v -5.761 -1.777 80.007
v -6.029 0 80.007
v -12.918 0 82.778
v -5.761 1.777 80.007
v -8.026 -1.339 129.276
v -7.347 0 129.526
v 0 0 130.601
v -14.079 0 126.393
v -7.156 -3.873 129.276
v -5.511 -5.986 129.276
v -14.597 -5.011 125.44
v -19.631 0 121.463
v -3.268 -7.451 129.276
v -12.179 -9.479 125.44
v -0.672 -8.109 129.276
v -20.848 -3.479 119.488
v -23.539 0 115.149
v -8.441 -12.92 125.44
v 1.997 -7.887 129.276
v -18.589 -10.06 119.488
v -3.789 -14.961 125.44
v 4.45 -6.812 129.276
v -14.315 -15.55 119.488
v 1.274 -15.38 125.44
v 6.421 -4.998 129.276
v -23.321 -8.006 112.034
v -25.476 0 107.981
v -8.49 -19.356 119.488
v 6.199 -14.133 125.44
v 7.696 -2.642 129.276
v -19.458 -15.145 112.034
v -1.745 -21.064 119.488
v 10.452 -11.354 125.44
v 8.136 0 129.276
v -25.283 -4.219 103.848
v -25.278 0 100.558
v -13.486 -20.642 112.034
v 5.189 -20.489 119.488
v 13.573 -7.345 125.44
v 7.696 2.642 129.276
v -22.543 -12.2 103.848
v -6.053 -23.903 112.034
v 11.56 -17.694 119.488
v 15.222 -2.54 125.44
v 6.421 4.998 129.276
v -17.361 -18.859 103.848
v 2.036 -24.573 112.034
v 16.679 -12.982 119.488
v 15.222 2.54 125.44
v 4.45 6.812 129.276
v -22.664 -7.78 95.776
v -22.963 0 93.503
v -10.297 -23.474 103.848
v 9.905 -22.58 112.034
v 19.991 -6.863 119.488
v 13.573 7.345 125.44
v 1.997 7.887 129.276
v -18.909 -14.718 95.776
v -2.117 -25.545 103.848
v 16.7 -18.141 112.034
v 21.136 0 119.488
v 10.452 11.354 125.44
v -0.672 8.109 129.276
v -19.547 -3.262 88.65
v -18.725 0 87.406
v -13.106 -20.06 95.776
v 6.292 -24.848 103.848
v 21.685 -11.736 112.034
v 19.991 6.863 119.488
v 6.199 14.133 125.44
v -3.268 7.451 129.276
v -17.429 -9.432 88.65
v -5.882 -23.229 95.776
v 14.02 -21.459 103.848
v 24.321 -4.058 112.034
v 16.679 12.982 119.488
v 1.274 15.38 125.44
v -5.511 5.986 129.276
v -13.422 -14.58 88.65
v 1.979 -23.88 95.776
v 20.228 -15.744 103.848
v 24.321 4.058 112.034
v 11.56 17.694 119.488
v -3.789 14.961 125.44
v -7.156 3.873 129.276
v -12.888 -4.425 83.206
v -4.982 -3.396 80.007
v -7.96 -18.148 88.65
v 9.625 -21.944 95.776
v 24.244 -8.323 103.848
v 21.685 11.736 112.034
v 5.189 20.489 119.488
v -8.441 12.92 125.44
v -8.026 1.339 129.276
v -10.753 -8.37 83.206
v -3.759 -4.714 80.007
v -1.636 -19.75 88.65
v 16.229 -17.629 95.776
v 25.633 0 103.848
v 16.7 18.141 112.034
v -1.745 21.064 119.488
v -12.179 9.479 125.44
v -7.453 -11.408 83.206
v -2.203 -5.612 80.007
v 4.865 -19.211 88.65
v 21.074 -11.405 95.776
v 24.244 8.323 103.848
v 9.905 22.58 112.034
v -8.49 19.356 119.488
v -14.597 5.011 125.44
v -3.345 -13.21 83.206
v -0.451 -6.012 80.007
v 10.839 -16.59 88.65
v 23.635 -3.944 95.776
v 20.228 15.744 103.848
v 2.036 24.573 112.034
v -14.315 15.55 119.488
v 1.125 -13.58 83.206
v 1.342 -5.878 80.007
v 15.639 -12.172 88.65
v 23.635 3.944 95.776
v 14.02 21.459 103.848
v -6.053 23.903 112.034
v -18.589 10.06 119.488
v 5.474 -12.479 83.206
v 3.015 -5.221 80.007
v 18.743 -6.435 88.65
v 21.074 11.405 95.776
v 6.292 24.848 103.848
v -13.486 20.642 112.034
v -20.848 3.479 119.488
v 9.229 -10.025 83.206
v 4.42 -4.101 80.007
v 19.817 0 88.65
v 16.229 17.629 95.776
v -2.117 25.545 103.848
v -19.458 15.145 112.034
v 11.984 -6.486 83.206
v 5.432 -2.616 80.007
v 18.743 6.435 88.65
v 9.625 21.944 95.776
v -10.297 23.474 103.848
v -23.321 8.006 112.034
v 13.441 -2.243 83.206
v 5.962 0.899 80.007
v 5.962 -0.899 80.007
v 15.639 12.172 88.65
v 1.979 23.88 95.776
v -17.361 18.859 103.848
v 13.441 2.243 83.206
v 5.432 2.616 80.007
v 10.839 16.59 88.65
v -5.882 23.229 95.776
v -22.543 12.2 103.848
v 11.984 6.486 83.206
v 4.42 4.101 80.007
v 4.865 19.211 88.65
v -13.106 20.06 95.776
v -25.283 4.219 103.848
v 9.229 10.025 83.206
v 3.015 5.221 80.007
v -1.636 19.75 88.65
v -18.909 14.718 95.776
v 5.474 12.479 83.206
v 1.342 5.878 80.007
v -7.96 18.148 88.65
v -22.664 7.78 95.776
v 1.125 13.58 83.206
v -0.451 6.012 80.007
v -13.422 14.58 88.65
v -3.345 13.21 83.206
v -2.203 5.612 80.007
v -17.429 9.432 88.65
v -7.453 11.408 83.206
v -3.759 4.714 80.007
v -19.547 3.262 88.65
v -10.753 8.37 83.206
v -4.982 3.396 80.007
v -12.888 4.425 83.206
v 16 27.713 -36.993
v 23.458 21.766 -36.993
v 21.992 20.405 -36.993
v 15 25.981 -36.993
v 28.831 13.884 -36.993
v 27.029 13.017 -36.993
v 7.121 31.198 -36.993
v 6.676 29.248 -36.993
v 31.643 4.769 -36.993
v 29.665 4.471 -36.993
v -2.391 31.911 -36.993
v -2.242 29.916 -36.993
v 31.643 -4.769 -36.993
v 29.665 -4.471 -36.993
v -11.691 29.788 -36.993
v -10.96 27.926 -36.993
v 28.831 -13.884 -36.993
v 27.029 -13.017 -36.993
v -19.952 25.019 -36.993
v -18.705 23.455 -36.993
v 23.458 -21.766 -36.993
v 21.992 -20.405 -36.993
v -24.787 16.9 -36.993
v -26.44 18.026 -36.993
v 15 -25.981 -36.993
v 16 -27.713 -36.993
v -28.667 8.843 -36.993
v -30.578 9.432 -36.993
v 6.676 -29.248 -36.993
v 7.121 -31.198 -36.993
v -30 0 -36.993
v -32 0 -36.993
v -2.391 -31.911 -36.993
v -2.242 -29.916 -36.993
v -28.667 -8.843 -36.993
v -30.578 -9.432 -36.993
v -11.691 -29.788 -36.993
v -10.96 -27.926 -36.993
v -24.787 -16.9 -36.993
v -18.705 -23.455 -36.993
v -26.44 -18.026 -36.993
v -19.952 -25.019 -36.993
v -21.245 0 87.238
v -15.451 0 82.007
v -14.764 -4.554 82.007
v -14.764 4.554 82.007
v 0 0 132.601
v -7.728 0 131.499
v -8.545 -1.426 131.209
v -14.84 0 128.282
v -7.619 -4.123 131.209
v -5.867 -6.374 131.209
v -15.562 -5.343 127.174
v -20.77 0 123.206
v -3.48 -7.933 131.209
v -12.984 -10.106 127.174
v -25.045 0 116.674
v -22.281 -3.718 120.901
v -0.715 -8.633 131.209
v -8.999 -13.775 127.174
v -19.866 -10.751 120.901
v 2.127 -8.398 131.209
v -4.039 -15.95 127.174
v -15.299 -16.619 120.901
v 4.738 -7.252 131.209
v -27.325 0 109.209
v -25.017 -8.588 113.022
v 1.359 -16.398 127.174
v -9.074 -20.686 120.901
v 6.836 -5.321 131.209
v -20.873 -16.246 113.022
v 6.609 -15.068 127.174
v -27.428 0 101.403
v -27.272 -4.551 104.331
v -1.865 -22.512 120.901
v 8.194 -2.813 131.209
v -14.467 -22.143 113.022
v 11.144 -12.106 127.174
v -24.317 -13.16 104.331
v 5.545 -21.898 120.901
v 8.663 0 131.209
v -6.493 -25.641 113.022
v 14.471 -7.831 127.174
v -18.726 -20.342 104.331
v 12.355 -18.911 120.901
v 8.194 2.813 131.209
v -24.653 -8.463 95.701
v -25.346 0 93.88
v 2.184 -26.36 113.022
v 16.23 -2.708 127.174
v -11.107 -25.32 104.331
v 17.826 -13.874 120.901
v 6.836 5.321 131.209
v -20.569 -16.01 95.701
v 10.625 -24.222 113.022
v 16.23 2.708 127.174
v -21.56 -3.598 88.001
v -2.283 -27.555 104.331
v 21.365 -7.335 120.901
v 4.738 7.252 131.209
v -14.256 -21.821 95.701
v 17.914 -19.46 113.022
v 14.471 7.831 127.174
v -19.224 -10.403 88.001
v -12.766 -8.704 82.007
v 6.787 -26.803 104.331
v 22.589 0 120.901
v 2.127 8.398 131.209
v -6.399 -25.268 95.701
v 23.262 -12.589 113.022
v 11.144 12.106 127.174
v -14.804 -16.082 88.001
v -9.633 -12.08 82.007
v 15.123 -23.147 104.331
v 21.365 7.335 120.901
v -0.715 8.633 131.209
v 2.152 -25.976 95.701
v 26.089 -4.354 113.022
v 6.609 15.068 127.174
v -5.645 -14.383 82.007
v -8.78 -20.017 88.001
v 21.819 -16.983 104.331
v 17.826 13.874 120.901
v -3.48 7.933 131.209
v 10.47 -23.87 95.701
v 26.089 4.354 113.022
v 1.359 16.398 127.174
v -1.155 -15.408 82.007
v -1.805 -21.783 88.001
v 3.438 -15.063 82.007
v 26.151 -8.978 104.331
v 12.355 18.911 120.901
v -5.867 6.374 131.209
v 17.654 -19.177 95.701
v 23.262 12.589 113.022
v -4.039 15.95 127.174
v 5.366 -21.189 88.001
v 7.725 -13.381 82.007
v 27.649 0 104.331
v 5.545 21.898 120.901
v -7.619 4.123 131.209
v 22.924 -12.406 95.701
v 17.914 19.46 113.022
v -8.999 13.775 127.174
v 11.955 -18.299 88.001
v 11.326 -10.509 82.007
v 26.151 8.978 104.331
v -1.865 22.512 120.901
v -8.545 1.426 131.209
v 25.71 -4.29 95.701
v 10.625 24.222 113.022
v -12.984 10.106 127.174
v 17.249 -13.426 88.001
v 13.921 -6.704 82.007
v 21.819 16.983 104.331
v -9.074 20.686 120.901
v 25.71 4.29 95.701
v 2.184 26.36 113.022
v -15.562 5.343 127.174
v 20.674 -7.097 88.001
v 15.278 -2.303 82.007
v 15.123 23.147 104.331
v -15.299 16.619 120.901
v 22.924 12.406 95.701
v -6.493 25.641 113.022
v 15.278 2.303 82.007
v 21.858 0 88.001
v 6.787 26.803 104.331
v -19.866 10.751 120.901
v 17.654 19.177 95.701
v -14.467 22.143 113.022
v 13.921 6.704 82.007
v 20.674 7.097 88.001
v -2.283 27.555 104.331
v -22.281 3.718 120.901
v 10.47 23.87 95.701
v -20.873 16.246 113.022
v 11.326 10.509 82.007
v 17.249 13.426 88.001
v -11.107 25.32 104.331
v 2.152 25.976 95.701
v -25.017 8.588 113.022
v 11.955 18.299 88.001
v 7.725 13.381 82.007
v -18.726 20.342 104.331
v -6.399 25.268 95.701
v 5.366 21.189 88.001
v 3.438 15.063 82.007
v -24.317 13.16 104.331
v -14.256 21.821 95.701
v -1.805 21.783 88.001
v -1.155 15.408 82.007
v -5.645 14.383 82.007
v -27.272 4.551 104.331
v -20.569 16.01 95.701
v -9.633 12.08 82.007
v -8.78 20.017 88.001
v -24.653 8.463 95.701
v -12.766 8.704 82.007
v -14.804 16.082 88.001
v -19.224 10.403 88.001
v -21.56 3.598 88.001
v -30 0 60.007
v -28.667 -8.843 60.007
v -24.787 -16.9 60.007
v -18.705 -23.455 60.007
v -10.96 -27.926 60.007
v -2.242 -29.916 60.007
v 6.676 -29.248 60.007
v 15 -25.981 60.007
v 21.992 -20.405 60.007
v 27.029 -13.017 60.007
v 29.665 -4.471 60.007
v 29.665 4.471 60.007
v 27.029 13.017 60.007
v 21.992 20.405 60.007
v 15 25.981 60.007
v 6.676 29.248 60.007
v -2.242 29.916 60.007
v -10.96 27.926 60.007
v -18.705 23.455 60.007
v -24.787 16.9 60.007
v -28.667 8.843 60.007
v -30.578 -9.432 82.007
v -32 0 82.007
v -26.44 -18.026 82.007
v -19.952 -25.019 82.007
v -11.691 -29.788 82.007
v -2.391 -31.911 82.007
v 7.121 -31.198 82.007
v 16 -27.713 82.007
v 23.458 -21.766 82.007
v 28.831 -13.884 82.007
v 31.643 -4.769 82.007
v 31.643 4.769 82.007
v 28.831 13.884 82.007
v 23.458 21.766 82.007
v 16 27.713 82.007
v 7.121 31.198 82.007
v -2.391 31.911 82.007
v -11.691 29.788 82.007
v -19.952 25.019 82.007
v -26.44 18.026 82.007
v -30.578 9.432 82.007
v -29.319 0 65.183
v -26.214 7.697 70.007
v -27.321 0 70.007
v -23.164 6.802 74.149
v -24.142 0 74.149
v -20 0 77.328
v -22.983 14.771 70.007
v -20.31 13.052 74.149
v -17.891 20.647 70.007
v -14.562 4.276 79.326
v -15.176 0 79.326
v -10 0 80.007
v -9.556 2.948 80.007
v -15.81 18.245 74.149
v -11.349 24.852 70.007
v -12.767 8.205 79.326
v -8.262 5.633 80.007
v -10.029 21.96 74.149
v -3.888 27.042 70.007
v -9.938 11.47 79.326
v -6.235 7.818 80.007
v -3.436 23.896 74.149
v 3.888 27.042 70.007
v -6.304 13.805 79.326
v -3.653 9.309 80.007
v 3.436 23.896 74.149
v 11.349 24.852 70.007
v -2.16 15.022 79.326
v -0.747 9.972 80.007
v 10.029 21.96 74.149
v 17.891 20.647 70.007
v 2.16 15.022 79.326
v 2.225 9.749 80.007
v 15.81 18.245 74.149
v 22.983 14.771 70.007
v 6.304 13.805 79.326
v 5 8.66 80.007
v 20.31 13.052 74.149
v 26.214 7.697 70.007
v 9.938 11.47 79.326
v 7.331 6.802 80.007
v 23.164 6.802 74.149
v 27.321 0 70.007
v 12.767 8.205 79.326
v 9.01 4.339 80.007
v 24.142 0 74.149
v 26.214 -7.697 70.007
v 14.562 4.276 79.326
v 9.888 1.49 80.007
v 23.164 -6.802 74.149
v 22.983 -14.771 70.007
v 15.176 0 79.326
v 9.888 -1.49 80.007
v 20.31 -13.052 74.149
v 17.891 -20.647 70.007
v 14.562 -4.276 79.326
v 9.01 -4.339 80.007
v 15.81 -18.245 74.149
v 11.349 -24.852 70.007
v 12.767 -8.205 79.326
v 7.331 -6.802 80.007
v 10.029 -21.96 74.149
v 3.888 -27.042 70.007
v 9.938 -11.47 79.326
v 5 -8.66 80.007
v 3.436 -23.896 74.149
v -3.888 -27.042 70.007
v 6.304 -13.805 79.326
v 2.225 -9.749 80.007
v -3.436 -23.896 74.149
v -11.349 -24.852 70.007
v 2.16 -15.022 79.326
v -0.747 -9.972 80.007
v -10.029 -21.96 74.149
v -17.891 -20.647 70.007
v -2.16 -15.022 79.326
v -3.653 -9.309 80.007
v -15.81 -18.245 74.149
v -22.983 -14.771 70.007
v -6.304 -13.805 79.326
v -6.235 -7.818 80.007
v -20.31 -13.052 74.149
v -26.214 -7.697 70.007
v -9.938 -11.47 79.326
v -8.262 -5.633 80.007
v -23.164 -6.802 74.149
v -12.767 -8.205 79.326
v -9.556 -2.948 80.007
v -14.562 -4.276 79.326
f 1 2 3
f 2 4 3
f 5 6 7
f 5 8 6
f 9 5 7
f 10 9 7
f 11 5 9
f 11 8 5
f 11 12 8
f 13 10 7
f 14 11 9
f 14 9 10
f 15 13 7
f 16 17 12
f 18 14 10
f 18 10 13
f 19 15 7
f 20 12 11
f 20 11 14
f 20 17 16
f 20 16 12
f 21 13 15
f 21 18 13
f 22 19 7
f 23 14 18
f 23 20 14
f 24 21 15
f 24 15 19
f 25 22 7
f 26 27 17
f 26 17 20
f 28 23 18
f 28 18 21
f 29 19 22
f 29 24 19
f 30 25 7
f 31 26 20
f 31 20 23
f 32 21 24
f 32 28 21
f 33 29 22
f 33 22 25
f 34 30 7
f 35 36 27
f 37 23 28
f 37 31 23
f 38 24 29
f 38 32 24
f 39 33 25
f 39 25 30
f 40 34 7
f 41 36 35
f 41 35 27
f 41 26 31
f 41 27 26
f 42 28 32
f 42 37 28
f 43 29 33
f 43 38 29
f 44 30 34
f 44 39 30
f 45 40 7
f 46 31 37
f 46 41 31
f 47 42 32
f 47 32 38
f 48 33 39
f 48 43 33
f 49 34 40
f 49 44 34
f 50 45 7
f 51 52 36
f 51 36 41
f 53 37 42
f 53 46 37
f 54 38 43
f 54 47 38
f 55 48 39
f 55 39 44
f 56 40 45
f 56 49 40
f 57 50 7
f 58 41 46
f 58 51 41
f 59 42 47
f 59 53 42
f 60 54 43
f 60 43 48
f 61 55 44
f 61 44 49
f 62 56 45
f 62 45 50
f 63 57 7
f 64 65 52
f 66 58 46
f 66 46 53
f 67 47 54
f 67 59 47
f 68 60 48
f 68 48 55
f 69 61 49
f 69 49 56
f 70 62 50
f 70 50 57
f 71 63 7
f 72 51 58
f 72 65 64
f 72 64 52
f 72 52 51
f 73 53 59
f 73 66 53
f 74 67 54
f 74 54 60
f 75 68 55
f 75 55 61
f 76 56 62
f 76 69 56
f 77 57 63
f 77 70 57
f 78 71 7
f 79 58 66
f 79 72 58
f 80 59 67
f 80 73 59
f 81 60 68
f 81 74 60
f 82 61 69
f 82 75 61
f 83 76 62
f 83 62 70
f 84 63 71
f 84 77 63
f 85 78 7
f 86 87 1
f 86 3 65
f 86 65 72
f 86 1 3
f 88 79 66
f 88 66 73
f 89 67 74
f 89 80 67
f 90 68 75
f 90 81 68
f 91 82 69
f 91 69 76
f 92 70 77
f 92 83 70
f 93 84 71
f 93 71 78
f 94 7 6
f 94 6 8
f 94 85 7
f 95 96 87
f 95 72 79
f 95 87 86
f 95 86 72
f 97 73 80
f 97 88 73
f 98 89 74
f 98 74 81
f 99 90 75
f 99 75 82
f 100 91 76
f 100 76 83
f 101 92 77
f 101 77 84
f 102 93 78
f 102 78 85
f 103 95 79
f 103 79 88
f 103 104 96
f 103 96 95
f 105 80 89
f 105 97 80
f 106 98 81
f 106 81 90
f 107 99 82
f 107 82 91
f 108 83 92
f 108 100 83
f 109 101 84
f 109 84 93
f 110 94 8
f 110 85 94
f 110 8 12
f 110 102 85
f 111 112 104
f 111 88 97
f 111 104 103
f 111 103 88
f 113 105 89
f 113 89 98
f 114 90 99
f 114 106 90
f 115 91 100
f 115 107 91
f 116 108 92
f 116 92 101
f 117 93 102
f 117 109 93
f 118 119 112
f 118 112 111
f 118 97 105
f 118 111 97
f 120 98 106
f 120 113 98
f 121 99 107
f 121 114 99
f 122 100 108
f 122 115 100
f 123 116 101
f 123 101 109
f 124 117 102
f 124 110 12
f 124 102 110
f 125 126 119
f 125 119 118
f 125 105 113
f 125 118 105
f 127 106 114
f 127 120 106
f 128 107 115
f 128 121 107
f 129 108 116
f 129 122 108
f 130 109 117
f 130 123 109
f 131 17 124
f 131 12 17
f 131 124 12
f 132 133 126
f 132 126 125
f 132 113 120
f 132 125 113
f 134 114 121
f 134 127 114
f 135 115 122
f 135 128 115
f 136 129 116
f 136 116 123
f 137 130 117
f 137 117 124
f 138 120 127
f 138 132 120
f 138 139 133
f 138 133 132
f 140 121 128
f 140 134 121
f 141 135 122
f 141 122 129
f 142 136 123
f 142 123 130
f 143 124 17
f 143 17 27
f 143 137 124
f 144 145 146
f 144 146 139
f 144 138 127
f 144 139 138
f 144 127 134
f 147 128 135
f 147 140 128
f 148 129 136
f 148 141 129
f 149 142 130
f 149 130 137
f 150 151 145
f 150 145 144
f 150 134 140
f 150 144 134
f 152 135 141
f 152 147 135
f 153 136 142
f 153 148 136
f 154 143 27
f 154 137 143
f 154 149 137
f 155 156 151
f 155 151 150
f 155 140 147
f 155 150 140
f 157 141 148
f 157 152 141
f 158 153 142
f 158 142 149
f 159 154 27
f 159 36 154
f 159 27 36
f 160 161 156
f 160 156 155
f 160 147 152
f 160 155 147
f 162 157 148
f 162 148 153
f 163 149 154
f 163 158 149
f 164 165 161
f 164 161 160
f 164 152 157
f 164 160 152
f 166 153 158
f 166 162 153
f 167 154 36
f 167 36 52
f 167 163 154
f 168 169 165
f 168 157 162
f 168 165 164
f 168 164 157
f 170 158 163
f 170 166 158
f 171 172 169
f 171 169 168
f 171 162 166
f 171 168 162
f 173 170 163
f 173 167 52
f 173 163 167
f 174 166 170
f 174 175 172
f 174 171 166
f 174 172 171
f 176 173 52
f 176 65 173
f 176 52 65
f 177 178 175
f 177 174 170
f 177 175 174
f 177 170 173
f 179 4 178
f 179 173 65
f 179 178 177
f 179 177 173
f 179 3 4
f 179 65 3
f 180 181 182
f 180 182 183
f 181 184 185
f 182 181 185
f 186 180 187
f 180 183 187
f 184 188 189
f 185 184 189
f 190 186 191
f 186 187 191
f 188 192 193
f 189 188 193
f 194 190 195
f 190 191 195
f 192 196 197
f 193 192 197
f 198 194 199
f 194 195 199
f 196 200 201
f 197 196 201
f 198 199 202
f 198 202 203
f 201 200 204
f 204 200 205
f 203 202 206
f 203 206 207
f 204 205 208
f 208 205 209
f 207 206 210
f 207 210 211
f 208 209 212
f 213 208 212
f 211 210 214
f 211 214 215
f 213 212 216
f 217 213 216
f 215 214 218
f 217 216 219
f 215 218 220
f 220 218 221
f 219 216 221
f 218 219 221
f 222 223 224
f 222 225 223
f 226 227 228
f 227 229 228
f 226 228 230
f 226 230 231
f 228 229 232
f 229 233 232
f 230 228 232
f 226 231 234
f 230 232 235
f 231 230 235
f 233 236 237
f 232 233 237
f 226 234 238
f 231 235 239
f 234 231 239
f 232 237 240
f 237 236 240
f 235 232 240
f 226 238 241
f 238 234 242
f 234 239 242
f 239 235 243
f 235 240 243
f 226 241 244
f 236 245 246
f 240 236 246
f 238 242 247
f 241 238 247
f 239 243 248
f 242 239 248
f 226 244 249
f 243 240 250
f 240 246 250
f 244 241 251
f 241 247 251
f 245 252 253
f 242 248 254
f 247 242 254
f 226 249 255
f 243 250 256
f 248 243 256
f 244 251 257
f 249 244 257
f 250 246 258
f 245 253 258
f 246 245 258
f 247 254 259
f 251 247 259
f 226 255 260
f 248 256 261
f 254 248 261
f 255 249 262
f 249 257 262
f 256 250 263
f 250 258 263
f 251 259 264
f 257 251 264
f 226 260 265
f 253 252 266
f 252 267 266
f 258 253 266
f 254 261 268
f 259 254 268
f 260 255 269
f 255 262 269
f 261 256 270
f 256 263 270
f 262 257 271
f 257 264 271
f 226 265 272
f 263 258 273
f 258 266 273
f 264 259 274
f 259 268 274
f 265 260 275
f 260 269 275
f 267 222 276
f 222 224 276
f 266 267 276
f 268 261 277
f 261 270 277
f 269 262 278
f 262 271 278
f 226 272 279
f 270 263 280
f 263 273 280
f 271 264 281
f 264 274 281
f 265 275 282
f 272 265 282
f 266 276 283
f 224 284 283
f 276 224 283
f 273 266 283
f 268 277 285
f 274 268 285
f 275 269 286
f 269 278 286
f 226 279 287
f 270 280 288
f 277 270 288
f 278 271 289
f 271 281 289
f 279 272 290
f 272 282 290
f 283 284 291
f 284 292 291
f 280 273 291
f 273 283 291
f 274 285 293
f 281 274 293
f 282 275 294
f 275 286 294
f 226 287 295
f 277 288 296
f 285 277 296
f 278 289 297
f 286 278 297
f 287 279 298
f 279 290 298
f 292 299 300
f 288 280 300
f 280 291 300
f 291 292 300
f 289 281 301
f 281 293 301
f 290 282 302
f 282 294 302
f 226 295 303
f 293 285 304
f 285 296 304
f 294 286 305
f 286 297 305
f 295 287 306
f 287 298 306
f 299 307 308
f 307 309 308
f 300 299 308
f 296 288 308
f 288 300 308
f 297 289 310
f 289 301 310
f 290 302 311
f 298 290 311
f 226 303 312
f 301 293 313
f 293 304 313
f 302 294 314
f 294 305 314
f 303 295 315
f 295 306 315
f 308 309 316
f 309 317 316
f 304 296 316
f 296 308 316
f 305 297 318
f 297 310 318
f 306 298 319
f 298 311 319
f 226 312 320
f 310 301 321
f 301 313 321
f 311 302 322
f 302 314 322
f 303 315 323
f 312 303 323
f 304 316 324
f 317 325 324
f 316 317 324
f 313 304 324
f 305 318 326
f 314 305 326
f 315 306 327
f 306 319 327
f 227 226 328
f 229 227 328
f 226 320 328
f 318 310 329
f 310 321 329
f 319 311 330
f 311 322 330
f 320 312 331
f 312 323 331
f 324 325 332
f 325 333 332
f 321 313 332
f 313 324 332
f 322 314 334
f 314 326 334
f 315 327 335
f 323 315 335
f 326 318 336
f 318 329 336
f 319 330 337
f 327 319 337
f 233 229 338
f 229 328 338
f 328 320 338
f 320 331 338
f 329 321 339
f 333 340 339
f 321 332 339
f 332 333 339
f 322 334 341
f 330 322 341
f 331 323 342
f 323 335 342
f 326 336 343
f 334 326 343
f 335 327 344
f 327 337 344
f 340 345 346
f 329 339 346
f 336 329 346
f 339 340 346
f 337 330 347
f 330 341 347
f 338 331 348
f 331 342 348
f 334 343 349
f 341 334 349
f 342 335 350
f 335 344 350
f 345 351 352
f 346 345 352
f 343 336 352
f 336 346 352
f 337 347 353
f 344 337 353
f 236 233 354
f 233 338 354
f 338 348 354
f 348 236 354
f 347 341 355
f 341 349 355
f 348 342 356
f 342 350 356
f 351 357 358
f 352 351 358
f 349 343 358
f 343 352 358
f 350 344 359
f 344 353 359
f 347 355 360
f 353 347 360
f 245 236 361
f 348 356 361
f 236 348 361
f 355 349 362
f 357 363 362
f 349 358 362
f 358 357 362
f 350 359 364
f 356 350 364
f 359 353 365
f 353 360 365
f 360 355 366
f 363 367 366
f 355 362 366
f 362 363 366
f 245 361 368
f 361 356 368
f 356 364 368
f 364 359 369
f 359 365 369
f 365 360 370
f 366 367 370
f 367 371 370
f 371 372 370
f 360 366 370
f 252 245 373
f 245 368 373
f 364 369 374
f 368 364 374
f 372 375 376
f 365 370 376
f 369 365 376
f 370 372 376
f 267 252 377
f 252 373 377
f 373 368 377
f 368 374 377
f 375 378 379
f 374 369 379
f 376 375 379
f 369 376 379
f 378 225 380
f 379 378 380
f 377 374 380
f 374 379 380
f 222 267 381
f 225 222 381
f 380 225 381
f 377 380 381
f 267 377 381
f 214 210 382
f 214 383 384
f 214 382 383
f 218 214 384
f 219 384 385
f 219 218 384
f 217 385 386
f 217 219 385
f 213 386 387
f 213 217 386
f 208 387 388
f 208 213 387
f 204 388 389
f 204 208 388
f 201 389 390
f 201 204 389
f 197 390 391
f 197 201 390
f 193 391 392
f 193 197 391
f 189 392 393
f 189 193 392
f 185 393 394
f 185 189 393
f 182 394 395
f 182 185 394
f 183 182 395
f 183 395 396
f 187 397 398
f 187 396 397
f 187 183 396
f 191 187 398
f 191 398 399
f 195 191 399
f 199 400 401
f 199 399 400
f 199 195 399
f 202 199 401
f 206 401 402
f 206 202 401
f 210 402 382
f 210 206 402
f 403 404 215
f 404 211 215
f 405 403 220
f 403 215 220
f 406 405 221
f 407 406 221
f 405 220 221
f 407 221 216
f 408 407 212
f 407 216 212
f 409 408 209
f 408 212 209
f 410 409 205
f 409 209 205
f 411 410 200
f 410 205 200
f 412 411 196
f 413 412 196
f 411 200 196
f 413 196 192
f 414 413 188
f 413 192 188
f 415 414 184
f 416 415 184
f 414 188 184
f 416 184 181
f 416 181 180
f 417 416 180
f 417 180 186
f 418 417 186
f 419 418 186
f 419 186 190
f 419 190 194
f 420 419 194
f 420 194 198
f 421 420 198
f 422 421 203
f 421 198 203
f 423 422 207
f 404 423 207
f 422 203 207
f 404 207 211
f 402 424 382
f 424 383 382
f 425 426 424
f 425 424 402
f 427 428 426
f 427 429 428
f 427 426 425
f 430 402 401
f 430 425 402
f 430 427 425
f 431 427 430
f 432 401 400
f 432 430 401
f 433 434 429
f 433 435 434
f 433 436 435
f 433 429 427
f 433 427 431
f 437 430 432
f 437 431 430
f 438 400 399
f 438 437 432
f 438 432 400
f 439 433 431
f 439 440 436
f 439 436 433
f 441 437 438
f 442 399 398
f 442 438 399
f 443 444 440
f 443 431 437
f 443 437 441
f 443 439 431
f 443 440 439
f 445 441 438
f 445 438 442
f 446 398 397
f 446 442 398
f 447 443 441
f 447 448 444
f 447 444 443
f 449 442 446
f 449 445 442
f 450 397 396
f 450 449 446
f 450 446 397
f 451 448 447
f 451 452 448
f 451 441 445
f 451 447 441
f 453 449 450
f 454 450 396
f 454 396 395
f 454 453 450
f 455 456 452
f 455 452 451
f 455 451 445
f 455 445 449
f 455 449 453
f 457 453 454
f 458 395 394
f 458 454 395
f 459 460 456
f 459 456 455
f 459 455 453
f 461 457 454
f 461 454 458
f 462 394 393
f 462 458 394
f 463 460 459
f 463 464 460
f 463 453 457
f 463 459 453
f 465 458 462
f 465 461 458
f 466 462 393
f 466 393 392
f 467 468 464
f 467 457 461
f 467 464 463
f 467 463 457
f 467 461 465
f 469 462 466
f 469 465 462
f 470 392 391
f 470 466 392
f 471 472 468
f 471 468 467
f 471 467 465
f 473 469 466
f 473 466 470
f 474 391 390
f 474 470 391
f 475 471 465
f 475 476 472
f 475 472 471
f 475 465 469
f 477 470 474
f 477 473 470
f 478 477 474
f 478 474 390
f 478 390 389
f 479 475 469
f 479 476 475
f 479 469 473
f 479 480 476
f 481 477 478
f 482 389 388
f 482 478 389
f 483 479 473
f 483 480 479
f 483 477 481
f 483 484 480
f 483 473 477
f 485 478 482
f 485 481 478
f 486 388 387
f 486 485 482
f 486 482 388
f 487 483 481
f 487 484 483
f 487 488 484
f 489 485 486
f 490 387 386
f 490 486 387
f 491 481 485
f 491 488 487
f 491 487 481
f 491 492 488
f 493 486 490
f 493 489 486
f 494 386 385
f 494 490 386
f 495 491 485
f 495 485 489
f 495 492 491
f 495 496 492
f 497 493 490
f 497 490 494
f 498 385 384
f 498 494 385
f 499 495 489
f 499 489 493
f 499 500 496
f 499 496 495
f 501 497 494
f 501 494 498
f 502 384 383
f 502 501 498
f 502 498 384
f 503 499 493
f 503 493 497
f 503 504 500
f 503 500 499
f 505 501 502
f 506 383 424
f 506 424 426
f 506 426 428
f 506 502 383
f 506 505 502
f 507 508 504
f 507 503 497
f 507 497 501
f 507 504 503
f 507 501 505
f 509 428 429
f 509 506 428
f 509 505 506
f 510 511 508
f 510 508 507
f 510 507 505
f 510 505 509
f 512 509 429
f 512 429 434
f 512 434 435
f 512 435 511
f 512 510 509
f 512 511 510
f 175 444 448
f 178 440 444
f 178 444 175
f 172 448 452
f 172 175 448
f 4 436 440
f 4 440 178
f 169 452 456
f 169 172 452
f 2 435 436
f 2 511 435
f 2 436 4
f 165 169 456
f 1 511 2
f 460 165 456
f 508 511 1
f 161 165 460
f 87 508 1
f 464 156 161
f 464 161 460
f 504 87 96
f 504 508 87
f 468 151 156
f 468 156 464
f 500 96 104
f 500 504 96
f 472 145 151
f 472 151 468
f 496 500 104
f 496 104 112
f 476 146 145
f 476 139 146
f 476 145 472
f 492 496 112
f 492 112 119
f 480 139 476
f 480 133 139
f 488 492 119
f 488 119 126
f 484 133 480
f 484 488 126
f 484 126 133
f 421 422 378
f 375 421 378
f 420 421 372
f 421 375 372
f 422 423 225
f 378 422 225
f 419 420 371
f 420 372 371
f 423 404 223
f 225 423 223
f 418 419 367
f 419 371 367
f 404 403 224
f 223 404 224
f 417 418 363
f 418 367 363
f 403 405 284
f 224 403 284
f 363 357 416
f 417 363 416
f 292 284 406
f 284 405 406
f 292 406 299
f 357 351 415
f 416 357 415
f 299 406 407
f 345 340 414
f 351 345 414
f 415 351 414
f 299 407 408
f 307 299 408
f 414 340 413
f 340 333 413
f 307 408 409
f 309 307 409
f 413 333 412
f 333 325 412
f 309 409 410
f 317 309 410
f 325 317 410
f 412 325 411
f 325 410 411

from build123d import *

# Parameters (mm, degrees)
F2_T = -2
F3_R = 20


with BuildPart() as f1:
    # F0 (on Front) → F1 (revolve)
    with BuildSketch(Plane.XZ):
        Polygon((-32, -36.9929058894), (0, -36.9929058894), (0, 74.4539797306), (0, 82.0070941106), (-15.4507753317, 82.0070941106), (-32, 82.0070941106), align=None)
        with BuildLine():
            Line((-15.4507753317, 82.0070941106), (0, 82.0070941106))
            Line((0, 82.0070941106), (0, 132.6008036984))
            ThreePointArc((0, 132.6008036984), (-26.4501886014, 113.0223019318), (-15.4507753317, 82.0070941106))
        make_face()
    revolve(axis=Axis((0, 0, 47.8039489045), (0, 0, 1)))

    # F2
    f2_openings = [f1.faces().sort_by_distance(p)[0] for p in [
        (0, 0, -36.992906),
    ]]
    offset(amount=F2_T, openings=f2_openings, kind=Kind.INTERSECTION)

    # F3
    f3_edges = [f1.edges().sort_by_distance(p)[0] for p in [
        (30, 0, 80.007094),
    ]]
    fillet(f3_edges, radius=F3_R)


solid = f1.part
